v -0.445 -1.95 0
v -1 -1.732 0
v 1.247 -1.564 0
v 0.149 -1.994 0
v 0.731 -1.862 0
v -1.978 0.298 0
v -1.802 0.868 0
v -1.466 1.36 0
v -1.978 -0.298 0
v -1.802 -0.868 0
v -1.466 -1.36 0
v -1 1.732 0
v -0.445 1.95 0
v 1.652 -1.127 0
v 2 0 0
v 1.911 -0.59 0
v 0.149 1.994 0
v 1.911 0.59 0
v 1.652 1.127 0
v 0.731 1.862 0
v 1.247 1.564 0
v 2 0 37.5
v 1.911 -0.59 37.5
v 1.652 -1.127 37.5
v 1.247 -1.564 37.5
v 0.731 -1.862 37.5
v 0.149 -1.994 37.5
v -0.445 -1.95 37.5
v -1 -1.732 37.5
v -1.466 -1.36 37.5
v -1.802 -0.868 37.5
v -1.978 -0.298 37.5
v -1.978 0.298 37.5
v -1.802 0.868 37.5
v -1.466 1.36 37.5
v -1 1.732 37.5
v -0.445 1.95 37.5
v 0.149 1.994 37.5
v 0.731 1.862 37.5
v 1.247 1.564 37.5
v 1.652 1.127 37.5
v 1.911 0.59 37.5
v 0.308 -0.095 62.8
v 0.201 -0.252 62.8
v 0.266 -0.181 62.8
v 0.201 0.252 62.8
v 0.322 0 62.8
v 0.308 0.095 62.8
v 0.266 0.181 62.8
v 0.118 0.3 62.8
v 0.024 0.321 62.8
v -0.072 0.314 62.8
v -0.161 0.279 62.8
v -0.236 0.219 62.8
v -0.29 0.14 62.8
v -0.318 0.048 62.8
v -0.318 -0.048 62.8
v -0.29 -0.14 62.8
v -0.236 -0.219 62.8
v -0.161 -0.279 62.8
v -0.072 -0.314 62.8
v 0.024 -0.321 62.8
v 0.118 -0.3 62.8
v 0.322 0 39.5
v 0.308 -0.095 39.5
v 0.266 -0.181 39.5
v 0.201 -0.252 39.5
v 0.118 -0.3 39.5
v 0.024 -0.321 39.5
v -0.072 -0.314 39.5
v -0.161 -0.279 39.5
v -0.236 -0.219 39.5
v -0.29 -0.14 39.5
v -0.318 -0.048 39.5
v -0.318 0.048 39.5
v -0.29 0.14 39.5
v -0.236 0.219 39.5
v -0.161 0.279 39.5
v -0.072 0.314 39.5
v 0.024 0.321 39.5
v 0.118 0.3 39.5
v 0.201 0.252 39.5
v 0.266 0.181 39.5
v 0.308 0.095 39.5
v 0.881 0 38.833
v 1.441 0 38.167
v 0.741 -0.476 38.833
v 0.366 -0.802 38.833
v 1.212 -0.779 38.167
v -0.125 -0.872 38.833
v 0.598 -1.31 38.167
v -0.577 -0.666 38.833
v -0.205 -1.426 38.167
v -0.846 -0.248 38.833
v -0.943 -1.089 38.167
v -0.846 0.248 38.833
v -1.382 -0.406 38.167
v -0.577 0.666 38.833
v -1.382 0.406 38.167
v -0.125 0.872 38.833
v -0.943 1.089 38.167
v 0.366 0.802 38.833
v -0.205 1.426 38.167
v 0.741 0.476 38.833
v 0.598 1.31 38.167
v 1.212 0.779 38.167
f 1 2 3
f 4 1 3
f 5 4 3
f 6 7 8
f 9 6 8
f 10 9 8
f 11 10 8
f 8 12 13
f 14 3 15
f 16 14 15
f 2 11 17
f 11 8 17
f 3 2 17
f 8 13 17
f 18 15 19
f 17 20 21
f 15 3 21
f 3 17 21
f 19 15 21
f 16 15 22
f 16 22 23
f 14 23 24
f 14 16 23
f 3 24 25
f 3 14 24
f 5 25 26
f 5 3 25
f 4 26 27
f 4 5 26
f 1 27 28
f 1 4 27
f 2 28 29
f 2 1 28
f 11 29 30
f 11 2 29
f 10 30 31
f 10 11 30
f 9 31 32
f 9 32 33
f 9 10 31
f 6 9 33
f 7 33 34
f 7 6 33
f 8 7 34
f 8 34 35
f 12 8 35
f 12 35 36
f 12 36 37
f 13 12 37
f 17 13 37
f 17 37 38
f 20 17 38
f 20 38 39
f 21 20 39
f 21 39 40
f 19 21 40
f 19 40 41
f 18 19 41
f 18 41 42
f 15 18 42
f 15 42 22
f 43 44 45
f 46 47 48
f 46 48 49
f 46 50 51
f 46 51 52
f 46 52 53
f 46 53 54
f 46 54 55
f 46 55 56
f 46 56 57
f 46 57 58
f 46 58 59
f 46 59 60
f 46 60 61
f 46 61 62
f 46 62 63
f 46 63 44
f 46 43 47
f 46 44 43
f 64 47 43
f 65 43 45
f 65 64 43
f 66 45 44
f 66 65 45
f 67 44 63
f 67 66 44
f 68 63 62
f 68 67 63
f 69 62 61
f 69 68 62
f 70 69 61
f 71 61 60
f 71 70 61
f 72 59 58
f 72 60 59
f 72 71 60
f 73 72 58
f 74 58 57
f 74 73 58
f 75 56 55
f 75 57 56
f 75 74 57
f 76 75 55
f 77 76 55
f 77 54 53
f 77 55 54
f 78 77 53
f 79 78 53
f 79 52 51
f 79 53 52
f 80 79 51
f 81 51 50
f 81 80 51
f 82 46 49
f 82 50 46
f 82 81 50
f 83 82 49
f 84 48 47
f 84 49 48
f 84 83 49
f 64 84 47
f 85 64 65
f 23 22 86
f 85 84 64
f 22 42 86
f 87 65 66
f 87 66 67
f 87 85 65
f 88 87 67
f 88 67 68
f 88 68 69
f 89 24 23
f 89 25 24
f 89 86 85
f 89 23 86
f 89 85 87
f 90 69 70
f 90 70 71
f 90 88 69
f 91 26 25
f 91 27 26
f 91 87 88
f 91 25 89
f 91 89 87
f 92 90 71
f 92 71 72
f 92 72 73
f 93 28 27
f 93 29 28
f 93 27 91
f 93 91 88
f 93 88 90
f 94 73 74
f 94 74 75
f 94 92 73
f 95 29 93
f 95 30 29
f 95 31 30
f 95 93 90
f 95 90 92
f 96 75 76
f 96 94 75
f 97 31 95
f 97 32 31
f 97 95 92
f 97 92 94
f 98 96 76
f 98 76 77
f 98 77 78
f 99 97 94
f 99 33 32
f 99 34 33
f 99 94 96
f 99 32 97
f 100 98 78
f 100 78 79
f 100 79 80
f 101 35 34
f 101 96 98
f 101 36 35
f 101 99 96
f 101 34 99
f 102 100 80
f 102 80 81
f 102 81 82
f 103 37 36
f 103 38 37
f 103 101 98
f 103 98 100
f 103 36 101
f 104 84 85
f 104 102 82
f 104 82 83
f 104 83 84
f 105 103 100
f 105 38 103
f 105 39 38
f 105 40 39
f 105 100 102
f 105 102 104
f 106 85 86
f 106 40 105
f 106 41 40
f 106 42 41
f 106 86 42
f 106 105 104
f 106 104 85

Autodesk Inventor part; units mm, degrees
ref_plane "YZ Plane" through (0, 0, 0) normal (1, 0, 0) x (0, 1, 0)
sketch "Sketch1" plane through (0, 0, 0) normal (0, 0, 1) x (1, 0, 0)
  circle A0 centre (0, 0) radius 6 projected
  circle A1 centre (0, 0) radius 2
  point P0 (0, 0)
  dimension "d0" = 4
ref_plane "Work Plane1" through (-3.5125, -3.5125, 37.5) normal (0, 0, 1) x (0.9087, 0.4175, 0)
extrude "Extrusion1" add sketch "Sketch1" along normal up to surface (37.5 mm away) contours A1
sketch "Sketch2" plane through (0, 0, 37.5) normal (0, 0, 1) x (1, 0, 0)
  circle A0 centre (0, 0) radius 2 projected
  point P0 (0, 0)
extrude "Extrusion2" add sketch "Sketch2" along normal blind 2 draft -40
sketch "Sketch3" plane through (0, 0, 39.5) normal (0, 0, 1) x (1, 0, 0)
  circle A0 centre (0, 0) radius 0.3218 projected
  point P0 (0, 0)
ref_plane "Work Plane2" through (-0.9, -20.4499, 62.8) normal (0, 0, 1) x (1, 0, 0)
extrude "Extrusion3" add sketch "Sketch3" along normal up to surface (23.3 mm away)
properties part number "cellSTORM_laserbeam"
